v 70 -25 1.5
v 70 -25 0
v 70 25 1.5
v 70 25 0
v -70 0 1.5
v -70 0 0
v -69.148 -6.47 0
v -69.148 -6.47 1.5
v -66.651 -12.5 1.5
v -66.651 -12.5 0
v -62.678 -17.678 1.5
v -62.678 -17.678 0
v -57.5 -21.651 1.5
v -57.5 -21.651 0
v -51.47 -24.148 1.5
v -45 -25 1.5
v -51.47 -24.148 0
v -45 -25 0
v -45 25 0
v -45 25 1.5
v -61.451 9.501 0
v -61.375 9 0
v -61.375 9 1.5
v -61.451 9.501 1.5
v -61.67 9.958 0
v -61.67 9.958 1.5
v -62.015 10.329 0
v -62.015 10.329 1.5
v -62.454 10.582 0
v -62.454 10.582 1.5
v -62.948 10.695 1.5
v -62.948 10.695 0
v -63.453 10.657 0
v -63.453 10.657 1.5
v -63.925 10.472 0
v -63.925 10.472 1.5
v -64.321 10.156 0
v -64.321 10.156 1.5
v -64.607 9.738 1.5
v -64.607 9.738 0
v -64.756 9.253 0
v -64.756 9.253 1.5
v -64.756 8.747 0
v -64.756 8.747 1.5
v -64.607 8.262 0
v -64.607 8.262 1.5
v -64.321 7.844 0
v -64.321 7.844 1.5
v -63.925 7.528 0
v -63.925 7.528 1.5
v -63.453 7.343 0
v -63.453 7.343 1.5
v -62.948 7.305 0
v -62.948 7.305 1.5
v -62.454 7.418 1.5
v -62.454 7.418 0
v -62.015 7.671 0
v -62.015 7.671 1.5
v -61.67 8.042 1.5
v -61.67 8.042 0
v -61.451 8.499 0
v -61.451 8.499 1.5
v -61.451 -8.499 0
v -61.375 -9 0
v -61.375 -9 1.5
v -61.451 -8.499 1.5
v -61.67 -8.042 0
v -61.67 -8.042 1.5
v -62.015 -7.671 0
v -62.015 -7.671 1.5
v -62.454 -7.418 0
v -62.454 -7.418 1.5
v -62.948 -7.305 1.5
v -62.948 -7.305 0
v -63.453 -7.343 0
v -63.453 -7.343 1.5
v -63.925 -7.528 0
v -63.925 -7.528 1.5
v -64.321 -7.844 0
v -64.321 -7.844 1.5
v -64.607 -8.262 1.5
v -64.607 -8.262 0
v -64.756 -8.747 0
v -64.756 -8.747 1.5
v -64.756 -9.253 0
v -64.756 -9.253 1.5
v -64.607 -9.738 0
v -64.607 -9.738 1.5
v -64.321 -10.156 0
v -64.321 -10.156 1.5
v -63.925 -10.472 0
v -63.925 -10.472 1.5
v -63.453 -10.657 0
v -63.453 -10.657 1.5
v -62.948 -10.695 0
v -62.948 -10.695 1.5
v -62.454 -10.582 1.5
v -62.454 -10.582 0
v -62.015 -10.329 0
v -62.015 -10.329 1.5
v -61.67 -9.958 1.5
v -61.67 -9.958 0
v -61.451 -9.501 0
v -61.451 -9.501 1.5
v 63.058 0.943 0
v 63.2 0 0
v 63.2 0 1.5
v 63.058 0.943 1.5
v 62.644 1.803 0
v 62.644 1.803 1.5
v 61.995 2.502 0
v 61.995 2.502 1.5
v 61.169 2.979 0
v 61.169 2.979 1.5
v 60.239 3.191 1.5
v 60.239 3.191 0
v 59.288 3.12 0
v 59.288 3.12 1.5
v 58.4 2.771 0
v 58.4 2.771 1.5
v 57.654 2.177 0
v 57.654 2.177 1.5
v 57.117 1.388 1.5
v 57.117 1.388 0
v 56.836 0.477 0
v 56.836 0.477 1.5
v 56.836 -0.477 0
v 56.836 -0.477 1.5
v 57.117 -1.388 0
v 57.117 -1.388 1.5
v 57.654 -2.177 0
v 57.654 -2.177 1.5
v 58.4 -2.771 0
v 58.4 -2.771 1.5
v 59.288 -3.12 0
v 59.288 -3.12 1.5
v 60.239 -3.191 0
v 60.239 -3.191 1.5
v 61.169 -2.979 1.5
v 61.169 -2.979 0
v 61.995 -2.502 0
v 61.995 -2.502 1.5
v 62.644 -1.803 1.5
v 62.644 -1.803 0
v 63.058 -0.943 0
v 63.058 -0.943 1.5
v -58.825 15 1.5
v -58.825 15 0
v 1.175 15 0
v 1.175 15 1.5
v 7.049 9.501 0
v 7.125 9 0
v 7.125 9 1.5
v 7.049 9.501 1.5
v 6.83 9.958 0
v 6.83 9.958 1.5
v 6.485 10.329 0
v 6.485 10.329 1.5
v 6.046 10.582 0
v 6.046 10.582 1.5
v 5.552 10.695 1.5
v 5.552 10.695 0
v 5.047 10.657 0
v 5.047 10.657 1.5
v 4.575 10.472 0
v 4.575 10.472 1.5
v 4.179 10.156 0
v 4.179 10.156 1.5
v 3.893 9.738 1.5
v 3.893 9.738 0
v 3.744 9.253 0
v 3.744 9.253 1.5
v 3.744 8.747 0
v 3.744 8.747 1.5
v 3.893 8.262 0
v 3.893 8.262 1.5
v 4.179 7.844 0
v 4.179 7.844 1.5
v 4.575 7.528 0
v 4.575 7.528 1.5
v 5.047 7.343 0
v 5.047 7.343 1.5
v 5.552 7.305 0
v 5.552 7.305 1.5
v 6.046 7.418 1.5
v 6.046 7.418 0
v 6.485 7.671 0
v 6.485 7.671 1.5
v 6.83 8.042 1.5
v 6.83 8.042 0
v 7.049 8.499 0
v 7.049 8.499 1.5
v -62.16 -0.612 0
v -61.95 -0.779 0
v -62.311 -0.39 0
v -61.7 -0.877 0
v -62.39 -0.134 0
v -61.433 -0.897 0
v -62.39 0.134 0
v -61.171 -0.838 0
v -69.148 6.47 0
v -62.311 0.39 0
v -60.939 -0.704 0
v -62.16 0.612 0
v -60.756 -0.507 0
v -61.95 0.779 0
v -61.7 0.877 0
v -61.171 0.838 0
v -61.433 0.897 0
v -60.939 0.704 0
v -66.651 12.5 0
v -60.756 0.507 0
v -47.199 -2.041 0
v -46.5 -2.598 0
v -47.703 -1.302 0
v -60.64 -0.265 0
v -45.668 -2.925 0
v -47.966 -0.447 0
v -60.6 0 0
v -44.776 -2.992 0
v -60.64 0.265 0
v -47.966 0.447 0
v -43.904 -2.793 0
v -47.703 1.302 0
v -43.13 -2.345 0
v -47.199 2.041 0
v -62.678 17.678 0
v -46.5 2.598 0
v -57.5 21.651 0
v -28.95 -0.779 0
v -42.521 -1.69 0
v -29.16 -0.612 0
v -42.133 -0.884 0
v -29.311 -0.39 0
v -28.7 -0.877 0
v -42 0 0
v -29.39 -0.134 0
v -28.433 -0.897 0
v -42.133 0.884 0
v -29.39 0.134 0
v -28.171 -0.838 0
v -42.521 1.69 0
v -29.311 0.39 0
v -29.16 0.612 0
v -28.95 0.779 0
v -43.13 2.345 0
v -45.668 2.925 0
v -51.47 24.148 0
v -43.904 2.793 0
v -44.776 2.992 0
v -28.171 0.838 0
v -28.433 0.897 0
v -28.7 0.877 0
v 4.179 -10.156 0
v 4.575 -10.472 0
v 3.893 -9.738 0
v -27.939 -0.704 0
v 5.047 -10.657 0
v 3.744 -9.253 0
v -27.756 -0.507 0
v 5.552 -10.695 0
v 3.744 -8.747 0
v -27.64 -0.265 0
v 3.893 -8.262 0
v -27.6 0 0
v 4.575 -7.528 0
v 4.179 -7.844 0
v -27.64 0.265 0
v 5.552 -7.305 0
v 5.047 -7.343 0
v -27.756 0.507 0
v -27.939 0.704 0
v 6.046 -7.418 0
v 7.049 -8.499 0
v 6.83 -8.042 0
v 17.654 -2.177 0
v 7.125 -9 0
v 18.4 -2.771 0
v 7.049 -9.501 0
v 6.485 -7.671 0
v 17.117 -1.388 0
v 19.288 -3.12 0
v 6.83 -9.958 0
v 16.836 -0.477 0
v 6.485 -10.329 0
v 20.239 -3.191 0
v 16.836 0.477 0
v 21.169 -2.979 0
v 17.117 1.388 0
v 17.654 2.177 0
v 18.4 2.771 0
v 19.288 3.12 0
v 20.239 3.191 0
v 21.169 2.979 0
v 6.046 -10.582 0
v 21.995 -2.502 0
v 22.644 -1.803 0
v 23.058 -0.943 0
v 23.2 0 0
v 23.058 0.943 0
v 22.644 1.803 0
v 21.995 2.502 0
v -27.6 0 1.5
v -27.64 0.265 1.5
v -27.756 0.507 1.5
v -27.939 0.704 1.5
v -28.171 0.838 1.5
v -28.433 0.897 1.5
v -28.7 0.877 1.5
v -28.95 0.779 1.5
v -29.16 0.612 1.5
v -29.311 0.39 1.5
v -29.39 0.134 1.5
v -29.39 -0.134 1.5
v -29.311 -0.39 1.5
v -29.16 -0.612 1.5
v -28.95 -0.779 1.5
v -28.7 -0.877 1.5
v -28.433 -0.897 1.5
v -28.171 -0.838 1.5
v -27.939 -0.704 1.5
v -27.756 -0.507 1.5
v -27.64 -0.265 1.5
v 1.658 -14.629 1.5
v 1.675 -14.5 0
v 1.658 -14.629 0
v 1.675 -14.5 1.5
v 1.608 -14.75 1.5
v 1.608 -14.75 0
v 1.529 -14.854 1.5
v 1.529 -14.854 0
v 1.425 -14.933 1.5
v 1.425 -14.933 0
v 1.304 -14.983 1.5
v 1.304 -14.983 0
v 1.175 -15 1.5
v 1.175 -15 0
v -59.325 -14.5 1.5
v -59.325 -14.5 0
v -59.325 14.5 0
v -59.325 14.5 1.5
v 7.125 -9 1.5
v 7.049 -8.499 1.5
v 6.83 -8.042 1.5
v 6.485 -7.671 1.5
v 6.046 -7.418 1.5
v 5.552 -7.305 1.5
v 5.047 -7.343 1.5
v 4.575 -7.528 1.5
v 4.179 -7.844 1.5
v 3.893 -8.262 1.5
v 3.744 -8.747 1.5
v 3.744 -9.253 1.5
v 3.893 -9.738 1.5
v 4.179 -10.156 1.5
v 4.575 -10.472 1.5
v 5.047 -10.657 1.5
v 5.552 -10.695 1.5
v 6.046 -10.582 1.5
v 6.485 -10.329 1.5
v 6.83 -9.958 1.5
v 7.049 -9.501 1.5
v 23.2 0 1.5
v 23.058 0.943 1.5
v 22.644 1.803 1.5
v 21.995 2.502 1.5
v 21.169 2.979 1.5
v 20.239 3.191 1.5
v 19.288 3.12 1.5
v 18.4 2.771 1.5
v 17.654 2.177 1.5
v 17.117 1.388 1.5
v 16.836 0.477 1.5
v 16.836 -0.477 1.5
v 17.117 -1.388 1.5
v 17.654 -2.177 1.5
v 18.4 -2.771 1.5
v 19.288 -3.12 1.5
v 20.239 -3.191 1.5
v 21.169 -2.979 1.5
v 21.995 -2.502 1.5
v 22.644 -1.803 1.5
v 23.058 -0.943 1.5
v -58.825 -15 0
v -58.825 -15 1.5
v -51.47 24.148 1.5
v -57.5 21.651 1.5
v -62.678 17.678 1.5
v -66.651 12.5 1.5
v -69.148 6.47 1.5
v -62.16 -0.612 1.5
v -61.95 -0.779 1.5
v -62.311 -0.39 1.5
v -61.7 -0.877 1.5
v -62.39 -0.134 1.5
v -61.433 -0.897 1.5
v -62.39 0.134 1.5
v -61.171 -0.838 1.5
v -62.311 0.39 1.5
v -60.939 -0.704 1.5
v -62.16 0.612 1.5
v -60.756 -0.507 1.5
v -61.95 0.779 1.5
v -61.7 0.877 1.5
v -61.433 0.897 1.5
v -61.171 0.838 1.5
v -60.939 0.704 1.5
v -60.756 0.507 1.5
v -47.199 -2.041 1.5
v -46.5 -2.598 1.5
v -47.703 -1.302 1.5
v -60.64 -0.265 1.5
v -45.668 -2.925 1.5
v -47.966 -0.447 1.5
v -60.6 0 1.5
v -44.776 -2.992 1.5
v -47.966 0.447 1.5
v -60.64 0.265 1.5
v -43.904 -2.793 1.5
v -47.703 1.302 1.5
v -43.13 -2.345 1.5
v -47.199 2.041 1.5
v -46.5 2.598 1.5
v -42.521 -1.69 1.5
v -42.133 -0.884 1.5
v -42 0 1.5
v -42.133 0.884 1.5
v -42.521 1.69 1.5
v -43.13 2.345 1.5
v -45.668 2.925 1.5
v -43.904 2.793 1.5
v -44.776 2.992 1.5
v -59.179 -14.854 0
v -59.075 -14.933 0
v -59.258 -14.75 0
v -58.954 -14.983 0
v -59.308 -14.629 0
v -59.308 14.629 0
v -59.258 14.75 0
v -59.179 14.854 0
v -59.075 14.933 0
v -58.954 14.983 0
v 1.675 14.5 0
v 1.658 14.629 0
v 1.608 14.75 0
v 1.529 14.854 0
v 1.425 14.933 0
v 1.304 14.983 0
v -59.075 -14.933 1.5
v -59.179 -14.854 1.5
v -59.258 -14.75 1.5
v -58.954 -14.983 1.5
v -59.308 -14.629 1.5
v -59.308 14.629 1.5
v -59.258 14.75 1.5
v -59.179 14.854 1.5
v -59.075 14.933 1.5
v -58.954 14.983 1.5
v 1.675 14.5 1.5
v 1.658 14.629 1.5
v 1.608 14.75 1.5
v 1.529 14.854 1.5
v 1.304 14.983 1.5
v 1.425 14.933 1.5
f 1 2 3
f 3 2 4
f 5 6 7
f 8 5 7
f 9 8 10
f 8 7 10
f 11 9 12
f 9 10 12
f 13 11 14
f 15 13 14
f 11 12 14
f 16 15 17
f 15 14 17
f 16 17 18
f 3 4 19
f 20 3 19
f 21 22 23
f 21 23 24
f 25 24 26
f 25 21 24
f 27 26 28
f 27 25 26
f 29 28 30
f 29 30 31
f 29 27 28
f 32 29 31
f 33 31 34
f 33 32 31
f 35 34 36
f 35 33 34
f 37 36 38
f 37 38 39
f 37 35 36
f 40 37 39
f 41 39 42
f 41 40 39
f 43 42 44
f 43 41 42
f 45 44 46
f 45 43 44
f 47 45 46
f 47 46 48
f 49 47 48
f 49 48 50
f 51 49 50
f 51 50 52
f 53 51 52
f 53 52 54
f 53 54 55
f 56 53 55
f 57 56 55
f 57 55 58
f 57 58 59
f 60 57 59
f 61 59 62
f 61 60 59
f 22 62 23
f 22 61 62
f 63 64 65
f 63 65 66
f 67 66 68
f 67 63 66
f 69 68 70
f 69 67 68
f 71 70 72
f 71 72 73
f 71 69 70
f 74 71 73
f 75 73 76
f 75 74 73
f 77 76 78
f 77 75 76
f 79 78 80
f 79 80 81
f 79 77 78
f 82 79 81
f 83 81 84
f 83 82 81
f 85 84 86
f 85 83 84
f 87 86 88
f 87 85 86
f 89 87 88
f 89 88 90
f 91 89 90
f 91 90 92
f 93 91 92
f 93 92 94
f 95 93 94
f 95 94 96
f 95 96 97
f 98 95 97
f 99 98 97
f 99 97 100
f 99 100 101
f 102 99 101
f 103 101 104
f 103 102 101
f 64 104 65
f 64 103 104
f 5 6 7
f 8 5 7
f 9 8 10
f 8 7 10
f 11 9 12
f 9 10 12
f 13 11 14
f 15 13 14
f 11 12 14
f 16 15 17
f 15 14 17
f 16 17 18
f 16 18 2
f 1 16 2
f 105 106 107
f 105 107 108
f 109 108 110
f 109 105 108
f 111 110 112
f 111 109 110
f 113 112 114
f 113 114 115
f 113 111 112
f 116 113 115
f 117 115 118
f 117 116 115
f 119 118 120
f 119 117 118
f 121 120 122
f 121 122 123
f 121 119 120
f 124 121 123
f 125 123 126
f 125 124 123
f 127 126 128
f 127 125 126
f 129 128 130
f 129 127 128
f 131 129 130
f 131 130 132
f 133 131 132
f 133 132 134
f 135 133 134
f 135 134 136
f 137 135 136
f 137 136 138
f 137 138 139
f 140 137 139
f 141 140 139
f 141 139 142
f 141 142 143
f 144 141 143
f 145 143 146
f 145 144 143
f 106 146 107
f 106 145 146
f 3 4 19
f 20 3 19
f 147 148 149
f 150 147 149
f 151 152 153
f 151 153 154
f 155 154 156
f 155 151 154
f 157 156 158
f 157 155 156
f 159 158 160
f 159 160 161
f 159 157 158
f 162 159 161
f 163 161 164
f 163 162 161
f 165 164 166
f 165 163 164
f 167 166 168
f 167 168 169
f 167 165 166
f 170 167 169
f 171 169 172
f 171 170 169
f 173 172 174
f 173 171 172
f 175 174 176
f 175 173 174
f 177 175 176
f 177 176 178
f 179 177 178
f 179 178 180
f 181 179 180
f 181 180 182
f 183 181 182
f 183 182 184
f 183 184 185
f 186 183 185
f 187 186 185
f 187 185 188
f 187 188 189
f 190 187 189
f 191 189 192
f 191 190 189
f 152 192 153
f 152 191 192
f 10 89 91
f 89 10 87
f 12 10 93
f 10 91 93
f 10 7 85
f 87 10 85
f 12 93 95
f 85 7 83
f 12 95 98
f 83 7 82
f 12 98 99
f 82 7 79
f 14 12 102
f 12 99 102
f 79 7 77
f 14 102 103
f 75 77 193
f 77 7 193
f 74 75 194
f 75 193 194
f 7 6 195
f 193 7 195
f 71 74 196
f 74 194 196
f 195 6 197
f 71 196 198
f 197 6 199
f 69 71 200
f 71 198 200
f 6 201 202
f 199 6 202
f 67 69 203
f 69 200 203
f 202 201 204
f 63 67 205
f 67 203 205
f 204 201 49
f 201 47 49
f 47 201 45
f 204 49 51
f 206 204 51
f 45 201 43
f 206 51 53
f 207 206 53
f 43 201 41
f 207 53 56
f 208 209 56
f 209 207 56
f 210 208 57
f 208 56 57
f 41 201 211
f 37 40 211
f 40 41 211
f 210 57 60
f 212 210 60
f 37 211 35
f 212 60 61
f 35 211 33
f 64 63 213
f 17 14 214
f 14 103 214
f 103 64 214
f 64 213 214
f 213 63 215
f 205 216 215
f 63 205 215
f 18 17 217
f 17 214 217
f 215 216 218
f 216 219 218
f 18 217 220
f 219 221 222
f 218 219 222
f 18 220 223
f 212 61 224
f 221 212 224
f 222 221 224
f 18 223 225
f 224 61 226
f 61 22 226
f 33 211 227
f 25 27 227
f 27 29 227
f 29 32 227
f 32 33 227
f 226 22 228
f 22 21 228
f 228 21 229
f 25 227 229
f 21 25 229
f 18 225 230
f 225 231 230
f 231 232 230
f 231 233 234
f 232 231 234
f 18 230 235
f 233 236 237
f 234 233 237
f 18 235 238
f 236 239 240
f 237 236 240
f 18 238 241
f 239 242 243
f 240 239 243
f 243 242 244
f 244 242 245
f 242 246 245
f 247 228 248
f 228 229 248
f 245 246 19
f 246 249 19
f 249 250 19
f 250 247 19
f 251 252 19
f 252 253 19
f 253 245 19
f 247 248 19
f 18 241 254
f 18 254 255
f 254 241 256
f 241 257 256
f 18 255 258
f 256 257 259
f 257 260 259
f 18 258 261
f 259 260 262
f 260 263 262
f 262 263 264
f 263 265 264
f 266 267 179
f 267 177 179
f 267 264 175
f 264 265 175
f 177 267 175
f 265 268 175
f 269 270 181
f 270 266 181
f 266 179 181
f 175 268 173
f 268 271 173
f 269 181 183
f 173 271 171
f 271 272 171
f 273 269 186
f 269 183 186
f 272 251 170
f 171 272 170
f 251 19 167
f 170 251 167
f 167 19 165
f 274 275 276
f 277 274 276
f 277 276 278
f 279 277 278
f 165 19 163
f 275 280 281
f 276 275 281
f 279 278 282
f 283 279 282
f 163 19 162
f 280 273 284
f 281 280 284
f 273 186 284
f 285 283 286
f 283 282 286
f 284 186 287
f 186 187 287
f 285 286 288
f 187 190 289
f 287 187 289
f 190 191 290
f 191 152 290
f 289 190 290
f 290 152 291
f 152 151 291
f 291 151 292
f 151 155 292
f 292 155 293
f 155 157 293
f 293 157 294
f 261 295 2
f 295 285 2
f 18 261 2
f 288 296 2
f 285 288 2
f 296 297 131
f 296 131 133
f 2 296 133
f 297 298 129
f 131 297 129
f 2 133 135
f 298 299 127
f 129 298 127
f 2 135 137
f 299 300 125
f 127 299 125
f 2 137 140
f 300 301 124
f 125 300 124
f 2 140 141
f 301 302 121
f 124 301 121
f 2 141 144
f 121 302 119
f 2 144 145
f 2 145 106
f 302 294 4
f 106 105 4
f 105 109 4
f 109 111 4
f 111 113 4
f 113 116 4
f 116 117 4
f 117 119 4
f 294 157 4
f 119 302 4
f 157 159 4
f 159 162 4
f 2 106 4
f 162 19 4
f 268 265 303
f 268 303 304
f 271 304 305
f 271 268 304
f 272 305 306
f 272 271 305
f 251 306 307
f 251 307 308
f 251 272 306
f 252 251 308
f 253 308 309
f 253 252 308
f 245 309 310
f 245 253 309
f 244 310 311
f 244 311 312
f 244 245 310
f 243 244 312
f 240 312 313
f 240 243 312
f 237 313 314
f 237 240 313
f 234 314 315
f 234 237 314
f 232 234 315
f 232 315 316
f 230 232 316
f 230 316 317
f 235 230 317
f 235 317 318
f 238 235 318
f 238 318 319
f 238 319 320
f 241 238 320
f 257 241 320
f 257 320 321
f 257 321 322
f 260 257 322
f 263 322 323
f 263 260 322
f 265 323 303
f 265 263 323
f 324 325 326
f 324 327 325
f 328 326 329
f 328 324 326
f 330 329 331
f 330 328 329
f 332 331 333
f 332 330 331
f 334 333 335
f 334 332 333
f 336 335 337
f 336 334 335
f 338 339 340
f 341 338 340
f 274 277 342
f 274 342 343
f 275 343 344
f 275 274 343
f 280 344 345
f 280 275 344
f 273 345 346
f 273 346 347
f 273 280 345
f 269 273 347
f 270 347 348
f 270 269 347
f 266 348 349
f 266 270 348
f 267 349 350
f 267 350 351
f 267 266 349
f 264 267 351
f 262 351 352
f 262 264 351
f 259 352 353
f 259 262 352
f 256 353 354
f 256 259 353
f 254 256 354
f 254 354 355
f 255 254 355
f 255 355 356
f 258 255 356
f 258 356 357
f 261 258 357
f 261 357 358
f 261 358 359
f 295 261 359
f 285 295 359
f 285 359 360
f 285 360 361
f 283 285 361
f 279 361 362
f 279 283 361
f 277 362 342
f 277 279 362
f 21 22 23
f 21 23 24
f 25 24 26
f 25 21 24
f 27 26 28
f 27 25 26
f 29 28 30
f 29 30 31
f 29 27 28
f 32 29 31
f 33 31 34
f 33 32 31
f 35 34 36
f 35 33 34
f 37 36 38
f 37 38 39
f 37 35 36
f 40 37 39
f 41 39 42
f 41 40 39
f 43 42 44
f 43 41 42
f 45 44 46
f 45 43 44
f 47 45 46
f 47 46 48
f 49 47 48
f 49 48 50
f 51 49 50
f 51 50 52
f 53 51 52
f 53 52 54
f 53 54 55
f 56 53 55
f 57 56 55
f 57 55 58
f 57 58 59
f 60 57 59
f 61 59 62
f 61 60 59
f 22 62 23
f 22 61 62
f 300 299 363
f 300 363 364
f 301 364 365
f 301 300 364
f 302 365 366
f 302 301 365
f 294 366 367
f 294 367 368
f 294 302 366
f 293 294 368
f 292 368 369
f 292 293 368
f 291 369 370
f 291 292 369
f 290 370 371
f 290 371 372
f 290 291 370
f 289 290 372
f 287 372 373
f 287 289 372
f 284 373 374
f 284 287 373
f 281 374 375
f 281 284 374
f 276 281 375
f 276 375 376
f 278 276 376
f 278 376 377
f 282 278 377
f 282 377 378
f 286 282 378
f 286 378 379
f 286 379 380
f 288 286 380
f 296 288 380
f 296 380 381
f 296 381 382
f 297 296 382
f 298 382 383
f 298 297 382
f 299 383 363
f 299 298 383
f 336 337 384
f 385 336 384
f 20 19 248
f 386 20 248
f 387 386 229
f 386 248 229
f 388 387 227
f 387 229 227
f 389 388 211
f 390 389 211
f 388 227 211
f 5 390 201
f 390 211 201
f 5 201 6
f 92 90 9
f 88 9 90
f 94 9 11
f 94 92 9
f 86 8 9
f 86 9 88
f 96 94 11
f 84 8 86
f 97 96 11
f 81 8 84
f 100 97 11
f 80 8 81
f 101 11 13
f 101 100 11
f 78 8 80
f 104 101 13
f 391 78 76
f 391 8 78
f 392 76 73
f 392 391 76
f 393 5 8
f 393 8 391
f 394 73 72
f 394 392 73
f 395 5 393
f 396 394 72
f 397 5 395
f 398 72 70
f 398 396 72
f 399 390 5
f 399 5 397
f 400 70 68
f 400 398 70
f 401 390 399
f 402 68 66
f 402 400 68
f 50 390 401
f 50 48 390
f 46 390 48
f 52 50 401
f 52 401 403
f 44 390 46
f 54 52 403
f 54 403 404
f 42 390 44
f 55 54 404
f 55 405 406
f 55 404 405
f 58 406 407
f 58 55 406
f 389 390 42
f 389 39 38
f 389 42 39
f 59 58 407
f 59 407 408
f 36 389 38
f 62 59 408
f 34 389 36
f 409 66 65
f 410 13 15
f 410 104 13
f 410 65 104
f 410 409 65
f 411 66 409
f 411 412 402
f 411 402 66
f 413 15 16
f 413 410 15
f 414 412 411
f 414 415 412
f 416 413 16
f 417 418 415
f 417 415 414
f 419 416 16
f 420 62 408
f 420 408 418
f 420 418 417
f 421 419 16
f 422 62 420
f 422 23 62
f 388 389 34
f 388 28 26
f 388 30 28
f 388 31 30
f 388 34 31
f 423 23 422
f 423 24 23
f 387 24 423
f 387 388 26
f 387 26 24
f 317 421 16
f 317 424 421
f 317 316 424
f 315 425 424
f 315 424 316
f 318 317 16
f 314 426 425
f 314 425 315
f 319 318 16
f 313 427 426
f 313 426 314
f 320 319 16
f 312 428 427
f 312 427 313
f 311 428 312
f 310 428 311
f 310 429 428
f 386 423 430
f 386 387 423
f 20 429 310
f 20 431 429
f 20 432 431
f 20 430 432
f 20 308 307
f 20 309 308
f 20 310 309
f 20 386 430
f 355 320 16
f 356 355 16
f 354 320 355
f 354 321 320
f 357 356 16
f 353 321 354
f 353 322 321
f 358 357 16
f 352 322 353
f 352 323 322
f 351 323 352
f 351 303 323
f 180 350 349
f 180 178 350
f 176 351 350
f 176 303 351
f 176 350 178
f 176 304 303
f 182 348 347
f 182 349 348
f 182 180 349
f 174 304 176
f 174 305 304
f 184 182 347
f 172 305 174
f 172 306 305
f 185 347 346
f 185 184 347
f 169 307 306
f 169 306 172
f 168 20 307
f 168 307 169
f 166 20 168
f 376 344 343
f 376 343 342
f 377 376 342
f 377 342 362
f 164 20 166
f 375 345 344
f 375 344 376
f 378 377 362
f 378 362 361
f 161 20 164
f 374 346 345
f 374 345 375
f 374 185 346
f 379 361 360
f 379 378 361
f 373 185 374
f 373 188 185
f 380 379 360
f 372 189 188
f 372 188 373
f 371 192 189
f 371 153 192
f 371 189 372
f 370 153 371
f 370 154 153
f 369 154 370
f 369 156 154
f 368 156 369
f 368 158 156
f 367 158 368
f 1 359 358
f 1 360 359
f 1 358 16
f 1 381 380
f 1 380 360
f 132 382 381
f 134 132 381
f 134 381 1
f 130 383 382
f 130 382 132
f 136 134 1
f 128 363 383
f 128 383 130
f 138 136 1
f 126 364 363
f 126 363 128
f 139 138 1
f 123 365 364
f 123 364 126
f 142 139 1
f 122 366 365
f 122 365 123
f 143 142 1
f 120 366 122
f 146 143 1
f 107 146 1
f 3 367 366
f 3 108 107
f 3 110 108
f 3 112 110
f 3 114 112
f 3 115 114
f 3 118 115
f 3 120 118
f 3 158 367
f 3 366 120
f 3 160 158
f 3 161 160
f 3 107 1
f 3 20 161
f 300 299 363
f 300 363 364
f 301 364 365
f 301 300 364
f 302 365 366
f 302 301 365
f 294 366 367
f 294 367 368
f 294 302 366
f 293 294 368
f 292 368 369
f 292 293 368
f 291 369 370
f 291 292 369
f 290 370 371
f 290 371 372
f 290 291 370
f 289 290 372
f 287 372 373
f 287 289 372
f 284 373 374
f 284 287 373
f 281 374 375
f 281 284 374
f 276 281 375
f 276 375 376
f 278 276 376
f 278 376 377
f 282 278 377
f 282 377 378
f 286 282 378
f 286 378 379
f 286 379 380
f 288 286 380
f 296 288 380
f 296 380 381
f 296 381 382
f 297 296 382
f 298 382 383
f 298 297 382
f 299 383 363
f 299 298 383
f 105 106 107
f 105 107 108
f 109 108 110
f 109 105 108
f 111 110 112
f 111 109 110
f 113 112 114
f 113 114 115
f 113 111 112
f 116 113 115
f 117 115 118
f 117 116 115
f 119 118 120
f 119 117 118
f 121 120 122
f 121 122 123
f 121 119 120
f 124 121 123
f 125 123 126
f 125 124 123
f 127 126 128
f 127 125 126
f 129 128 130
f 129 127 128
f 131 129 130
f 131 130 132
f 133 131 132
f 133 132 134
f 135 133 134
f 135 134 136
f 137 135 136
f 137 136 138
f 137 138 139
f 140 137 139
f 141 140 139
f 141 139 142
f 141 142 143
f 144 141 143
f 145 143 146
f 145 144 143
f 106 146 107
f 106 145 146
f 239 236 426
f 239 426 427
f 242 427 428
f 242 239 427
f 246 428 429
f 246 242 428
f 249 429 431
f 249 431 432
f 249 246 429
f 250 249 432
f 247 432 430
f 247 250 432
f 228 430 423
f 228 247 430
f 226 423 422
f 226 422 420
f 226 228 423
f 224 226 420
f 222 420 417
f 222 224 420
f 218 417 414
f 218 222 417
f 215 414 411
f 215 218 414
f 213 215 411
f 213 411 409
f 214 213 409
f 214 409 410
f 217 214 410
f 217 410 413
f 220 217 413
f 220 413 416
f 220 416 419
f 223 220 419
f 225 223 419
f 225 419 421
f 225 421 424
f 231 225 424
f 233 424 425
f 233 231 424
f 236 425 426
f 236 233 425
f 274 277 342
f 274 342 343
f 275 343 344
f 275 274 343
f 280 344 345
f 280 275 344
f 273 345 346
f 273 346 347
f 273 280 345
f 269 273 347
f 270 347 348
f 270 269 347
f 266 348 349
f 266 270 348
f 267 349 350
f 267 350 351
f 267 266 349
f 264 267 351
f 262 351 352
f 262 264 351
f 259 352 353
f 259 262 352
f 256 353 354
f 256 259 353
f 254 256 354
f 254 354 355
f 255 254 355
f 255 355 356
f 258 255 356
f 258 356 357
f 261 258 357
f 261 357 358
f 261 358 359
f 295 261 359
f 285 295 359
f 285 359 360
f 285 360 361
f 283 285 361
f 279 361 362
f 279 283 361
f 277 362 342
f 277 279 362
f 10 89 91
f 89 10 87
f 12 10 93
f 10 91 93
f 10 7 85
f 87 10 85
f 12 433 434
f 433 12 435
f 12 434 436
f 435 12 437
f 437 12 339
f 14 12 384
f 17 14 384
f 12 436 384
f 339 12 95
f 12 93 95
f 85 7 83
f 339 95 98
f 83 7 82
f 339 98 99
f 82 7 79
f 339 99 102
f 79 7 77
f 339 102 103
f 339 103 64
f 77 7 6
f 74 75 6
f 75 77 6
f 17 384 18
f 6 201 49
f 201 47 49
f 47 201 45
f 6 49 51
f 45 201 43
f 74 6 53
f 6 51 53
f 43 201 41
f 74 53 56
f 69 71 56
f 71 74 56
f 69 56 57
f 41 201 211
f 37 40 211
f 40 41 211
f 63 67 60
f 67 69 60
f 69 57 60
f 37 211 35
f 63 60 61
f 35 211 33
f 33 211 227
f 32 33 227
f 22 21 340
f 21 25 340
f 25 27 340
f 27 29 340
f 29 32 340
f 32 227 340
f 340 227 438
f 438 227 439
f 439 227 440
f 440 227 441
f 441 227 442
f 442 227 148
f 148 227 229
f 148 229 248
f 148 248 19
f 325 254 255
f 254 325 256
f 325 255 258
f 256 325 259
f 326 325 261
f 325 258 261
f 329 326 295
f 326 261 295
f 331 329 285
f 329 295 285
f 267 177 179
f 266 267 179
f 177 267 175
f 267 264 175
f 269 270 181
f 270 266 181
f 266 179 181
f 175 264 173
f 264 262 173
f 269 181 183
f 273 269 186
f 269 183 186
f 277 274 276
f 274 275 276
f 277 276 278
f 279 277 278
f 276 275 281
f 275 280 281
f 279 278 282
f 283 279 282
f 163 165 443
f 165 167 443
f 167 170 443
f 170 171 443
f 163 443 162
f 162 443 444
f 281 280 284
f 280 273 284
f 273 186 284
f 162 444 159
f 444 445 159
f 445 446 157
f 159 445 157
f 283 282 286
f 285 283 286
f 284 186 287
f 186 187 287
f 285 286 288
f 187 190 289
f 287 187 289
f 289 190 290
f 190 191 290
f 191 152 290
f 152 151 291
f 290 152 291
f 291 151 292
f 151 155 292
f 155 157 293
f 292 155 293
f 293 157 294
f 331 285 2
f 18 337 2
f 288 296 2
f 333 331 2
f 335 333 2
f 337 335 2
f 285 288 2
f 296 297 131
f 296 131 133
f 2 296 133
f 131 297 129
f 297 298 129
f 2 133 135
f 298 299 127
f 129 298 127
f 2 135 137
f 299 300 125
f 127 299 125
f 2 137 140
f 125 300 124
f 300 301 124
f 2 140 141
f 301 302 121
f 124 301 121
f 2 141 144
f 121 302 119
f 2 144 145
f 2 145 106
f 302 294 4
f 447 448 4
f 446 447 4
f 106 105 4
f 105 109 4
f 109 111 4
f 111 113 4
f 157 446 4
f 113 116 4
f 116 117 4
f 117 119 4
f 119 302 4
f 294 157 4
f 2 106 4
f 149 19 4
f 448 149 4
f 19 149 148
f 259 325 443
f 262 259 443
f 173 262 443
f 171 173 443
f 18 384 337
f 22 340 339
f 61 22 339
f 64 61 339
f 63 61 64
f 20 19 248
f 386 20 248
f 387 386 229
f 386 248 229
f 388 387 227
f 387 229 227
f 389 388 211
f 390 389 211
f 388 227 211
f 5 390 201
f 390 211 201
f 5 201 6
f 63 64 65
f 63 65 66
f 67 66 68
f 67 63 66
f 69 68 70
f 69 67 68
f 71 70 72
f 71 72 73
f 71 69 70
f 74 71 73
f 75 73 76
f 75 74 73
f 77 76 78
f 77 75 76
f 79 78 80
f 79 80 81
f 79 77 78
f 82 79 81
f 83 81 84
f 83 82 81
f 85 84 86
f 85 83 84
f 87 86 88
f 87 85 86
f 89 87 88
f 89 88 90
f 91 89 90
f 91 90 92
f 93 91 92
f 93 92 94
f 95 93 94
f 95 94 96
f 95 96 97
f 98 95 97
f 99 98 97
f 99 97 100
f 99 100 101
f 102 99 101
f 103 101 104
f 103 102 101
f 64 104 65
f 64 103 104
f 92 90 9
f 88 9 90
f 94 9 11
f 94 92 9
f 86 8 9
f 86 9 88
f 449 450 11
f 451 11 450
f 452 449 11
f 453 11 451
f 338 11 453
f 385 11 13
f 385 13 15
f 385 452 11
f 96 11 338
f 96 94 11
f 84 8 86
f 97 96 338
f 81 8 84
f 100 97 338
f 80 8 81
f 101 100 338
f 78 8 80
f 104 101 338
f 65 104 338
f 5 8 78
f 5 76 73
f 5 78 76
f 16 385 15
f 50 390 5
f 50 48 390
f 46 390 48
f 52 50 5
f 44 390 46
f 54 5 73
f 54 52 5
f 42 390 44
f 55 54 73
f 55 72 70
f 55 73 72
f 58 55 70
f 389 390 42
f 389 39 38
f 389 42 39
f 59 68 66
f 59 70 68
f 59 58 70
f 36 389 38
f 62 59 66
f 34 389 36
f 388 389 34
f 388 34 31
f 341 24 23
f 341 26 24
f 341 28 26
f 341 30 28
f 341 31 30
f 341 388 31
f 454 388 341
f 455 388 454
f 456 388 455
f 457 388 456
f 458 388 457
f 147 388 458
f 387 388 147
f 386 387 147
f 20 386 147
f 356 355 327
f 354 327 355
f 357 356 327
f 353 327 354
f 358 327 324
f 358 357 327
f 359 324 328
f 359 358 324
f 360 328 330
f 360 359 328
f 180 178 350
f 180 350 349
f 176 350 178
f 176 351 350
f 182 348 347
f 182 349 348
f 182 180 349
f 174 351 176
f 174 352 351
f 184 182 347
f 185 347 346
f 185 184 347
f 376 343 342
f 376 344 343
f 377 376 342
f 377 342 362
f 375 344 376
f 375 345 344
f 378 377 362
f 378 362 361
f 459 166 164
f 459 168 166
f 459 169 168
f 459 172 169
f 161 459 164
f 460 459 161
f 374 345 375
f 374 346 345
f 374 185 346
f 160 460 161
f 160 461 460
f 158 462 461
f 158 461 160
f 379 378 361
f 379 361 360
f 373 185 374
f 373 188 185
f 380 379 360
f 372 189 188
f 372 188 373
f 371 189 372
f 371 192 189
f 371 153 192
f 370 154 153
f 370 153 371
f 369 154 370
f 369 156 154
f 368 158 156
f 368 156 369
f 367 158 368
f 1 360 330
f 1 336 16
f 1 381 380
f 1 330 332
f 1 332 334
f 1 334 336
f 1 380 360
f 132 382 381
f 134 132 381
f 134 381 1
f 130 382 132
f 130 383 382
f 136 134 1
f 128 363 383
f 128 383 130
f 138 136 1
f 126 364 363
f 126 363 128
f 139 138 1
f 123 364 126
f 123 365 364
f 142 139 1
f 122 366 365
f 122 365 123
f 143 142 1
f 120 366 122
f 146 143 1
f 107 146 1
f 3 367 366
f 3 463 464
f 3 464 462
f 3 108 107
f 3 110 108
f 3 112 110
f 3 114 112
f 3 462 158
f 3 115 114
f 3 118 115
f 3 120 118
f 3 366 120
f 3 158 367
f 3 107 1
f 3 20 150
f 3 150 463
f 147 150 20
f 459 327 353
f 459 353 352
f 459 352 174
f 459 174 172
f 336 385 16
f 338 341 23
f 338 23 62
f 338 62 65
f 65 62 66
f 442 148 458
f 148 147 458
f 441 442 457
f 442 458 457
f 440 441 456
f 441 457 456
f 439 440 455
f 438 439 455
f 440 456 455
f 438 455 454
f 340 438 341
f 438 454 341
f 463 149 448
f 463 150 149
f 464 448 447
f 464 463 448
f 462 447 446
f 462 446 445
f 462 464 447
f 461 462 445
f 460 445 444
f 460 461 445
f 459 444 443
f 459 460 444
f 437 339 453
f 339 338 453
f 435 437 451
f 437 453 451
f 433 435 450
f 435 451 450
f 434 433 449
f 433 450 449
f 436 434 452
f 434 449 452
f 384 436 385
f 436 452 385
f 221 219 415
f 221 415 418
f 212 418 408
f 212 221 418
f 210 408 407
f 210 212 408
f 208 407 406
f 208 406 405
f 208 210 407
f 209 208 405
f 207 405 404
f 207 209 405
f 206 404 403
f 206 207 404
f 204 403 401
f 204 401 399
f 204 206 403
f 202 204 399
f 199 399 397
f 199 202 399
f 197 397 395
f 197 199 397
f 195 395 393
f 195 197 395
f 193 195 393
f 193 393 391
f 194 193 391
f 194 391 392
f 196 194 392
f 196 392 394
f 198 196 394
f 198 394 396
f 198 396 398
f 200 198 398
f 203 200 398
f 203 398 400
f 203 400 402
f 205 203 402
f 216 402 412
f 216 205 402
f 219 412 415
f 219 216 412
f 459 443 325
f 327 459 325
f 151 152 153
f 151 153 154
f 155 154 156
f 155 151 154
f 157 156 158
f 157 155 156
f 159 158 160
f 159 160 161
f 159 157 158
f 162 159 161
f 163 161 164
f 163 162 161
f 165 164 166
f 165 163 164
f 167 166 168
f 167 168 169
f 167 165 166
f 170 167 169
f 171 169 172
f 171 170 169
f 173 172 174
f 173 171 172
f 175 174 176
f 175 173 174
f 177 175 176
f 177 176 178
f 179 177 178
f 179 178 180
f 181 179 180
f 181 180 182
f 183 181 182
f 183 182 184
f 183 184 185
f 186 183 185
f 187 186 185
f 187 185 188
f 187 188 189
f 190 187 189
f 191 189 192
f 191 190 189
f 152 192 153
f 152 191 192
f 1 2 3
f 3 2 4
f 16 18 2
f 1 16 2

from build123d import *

# Parameters (mm, degrees)
F0_R     = 1.7
F0_R_2   = 0.9
F0_R_3   = 3
F0_R_4   = 3.2
F1_DEPTH = 1.5
F2_R     = 1.7
F2_R_2   = 3.2
F3_DEPTH = 1.5
F4_R     = 0.5


with BuildPart() as f1:
    # F0 (on Top) → F1 (new body)
    with BuildSketch(Plane.XY):
        with BuildLine():
            Line((70, -25), (70, 25))
            Line((70, 25), (-45, 25))
            ThreePointArc((-45, 25), (-62.67767, 17.67767), (-70, 0))
            ThreePointArc((-70, 0), (-62.67767, -17.67767), (-45, -25))
            Line((-45, -25), (70, -25))
        make_face()
        with Locations((-63.075, -9)):
            Circle(F0_R, mode=Mode.SUBTRACT)
        with Locations((5.425, -9)):
            Circle(F0_R, mode=Mode.SUBTRACT)
        with Locations((-61.5, 0)):
            Circle(F0_R_2, mode=Mode.SUBTRACT)
        with Locations((-45, 0)):
            Circle(F0_R_3, mode=Mode.SUBTRACT)
        with Locations((-63.075, 9)):
            Circle(F0_R, mode=Mode.SUBTRACT)
        with Locations((-28.5, 0)):
            Circle(F0_R_2, mode=Mode.SUBTRACT)
        with Locations((20, 0)):
            Circle(F0_R_4, mode=Mode.SUBTRACT)
        with Locations((5.425, 9)):
            Circle(F0_R, mode=Mode.SUBTRACT)
        with Locations((60, 0)):
            Circle(F0_R_4, mode=Mode.SUBTRACT)
    extrude(amount=F1_DEPTH)


with BuildPart() as f3:
    # F2 (on Top) → F3 (new body)
    with BuildSketch(Plane.XY):
        with BuildLine():
            Line((70, -25), (70, 25))
            Line((70, 25), (-45, 25))
            ThreePointArc((-45, 25), (-62.67767, 17.67767), (-70, 0))
            ThreePointArc((-70, 0), (-62.67767, -17.67767), (-45, -25))
            Line((-45, -25), (70, -25))
        make_face()
        with Locations((-63.075, -9)):
            Circle(F2_R, mode=Mode.SUBTRACT)
        with Locations((5.425, -9)):
            Circle(F2_R, mode=Mode.SUBTRACT)
        with Locations((-63.075, 9)):
            Circle(F2_R, mode=Mode.SUBTRACT)
        Polygon((-28.825, 15), (1.675, 15), (1.675, -15), (-28.825, -15), (-59.325, -15), (-59.325, 15), align=None, mode=Mode.SUBTRACT)
        with Locations((20, 0)):
            Circle(F2_R_2, mode=Mode.SUBTRACT)
        with Locations((5.425, 9)):
            Circle(F2_R, mode=Mode.SUBTRACT)
        with Locations((60, 0)):
            Circle(F2_R_2, mode=Mode.SUBTRACT)
    extrude(amount=F3_DEPTH)

    # F4
    f4_edges = [f3.edges().sort_by_distance(p)[0] for p in [
        (-59.325, 15, 0.75),
        (-59.325, -15, 0.75),
        (1.675, -15, 0.75),
        (1.675, 15, 0.75),
    ]]
    fillet(f4_edges, radius=F4_R)


solid = Compound([f1.part, f3.part])
